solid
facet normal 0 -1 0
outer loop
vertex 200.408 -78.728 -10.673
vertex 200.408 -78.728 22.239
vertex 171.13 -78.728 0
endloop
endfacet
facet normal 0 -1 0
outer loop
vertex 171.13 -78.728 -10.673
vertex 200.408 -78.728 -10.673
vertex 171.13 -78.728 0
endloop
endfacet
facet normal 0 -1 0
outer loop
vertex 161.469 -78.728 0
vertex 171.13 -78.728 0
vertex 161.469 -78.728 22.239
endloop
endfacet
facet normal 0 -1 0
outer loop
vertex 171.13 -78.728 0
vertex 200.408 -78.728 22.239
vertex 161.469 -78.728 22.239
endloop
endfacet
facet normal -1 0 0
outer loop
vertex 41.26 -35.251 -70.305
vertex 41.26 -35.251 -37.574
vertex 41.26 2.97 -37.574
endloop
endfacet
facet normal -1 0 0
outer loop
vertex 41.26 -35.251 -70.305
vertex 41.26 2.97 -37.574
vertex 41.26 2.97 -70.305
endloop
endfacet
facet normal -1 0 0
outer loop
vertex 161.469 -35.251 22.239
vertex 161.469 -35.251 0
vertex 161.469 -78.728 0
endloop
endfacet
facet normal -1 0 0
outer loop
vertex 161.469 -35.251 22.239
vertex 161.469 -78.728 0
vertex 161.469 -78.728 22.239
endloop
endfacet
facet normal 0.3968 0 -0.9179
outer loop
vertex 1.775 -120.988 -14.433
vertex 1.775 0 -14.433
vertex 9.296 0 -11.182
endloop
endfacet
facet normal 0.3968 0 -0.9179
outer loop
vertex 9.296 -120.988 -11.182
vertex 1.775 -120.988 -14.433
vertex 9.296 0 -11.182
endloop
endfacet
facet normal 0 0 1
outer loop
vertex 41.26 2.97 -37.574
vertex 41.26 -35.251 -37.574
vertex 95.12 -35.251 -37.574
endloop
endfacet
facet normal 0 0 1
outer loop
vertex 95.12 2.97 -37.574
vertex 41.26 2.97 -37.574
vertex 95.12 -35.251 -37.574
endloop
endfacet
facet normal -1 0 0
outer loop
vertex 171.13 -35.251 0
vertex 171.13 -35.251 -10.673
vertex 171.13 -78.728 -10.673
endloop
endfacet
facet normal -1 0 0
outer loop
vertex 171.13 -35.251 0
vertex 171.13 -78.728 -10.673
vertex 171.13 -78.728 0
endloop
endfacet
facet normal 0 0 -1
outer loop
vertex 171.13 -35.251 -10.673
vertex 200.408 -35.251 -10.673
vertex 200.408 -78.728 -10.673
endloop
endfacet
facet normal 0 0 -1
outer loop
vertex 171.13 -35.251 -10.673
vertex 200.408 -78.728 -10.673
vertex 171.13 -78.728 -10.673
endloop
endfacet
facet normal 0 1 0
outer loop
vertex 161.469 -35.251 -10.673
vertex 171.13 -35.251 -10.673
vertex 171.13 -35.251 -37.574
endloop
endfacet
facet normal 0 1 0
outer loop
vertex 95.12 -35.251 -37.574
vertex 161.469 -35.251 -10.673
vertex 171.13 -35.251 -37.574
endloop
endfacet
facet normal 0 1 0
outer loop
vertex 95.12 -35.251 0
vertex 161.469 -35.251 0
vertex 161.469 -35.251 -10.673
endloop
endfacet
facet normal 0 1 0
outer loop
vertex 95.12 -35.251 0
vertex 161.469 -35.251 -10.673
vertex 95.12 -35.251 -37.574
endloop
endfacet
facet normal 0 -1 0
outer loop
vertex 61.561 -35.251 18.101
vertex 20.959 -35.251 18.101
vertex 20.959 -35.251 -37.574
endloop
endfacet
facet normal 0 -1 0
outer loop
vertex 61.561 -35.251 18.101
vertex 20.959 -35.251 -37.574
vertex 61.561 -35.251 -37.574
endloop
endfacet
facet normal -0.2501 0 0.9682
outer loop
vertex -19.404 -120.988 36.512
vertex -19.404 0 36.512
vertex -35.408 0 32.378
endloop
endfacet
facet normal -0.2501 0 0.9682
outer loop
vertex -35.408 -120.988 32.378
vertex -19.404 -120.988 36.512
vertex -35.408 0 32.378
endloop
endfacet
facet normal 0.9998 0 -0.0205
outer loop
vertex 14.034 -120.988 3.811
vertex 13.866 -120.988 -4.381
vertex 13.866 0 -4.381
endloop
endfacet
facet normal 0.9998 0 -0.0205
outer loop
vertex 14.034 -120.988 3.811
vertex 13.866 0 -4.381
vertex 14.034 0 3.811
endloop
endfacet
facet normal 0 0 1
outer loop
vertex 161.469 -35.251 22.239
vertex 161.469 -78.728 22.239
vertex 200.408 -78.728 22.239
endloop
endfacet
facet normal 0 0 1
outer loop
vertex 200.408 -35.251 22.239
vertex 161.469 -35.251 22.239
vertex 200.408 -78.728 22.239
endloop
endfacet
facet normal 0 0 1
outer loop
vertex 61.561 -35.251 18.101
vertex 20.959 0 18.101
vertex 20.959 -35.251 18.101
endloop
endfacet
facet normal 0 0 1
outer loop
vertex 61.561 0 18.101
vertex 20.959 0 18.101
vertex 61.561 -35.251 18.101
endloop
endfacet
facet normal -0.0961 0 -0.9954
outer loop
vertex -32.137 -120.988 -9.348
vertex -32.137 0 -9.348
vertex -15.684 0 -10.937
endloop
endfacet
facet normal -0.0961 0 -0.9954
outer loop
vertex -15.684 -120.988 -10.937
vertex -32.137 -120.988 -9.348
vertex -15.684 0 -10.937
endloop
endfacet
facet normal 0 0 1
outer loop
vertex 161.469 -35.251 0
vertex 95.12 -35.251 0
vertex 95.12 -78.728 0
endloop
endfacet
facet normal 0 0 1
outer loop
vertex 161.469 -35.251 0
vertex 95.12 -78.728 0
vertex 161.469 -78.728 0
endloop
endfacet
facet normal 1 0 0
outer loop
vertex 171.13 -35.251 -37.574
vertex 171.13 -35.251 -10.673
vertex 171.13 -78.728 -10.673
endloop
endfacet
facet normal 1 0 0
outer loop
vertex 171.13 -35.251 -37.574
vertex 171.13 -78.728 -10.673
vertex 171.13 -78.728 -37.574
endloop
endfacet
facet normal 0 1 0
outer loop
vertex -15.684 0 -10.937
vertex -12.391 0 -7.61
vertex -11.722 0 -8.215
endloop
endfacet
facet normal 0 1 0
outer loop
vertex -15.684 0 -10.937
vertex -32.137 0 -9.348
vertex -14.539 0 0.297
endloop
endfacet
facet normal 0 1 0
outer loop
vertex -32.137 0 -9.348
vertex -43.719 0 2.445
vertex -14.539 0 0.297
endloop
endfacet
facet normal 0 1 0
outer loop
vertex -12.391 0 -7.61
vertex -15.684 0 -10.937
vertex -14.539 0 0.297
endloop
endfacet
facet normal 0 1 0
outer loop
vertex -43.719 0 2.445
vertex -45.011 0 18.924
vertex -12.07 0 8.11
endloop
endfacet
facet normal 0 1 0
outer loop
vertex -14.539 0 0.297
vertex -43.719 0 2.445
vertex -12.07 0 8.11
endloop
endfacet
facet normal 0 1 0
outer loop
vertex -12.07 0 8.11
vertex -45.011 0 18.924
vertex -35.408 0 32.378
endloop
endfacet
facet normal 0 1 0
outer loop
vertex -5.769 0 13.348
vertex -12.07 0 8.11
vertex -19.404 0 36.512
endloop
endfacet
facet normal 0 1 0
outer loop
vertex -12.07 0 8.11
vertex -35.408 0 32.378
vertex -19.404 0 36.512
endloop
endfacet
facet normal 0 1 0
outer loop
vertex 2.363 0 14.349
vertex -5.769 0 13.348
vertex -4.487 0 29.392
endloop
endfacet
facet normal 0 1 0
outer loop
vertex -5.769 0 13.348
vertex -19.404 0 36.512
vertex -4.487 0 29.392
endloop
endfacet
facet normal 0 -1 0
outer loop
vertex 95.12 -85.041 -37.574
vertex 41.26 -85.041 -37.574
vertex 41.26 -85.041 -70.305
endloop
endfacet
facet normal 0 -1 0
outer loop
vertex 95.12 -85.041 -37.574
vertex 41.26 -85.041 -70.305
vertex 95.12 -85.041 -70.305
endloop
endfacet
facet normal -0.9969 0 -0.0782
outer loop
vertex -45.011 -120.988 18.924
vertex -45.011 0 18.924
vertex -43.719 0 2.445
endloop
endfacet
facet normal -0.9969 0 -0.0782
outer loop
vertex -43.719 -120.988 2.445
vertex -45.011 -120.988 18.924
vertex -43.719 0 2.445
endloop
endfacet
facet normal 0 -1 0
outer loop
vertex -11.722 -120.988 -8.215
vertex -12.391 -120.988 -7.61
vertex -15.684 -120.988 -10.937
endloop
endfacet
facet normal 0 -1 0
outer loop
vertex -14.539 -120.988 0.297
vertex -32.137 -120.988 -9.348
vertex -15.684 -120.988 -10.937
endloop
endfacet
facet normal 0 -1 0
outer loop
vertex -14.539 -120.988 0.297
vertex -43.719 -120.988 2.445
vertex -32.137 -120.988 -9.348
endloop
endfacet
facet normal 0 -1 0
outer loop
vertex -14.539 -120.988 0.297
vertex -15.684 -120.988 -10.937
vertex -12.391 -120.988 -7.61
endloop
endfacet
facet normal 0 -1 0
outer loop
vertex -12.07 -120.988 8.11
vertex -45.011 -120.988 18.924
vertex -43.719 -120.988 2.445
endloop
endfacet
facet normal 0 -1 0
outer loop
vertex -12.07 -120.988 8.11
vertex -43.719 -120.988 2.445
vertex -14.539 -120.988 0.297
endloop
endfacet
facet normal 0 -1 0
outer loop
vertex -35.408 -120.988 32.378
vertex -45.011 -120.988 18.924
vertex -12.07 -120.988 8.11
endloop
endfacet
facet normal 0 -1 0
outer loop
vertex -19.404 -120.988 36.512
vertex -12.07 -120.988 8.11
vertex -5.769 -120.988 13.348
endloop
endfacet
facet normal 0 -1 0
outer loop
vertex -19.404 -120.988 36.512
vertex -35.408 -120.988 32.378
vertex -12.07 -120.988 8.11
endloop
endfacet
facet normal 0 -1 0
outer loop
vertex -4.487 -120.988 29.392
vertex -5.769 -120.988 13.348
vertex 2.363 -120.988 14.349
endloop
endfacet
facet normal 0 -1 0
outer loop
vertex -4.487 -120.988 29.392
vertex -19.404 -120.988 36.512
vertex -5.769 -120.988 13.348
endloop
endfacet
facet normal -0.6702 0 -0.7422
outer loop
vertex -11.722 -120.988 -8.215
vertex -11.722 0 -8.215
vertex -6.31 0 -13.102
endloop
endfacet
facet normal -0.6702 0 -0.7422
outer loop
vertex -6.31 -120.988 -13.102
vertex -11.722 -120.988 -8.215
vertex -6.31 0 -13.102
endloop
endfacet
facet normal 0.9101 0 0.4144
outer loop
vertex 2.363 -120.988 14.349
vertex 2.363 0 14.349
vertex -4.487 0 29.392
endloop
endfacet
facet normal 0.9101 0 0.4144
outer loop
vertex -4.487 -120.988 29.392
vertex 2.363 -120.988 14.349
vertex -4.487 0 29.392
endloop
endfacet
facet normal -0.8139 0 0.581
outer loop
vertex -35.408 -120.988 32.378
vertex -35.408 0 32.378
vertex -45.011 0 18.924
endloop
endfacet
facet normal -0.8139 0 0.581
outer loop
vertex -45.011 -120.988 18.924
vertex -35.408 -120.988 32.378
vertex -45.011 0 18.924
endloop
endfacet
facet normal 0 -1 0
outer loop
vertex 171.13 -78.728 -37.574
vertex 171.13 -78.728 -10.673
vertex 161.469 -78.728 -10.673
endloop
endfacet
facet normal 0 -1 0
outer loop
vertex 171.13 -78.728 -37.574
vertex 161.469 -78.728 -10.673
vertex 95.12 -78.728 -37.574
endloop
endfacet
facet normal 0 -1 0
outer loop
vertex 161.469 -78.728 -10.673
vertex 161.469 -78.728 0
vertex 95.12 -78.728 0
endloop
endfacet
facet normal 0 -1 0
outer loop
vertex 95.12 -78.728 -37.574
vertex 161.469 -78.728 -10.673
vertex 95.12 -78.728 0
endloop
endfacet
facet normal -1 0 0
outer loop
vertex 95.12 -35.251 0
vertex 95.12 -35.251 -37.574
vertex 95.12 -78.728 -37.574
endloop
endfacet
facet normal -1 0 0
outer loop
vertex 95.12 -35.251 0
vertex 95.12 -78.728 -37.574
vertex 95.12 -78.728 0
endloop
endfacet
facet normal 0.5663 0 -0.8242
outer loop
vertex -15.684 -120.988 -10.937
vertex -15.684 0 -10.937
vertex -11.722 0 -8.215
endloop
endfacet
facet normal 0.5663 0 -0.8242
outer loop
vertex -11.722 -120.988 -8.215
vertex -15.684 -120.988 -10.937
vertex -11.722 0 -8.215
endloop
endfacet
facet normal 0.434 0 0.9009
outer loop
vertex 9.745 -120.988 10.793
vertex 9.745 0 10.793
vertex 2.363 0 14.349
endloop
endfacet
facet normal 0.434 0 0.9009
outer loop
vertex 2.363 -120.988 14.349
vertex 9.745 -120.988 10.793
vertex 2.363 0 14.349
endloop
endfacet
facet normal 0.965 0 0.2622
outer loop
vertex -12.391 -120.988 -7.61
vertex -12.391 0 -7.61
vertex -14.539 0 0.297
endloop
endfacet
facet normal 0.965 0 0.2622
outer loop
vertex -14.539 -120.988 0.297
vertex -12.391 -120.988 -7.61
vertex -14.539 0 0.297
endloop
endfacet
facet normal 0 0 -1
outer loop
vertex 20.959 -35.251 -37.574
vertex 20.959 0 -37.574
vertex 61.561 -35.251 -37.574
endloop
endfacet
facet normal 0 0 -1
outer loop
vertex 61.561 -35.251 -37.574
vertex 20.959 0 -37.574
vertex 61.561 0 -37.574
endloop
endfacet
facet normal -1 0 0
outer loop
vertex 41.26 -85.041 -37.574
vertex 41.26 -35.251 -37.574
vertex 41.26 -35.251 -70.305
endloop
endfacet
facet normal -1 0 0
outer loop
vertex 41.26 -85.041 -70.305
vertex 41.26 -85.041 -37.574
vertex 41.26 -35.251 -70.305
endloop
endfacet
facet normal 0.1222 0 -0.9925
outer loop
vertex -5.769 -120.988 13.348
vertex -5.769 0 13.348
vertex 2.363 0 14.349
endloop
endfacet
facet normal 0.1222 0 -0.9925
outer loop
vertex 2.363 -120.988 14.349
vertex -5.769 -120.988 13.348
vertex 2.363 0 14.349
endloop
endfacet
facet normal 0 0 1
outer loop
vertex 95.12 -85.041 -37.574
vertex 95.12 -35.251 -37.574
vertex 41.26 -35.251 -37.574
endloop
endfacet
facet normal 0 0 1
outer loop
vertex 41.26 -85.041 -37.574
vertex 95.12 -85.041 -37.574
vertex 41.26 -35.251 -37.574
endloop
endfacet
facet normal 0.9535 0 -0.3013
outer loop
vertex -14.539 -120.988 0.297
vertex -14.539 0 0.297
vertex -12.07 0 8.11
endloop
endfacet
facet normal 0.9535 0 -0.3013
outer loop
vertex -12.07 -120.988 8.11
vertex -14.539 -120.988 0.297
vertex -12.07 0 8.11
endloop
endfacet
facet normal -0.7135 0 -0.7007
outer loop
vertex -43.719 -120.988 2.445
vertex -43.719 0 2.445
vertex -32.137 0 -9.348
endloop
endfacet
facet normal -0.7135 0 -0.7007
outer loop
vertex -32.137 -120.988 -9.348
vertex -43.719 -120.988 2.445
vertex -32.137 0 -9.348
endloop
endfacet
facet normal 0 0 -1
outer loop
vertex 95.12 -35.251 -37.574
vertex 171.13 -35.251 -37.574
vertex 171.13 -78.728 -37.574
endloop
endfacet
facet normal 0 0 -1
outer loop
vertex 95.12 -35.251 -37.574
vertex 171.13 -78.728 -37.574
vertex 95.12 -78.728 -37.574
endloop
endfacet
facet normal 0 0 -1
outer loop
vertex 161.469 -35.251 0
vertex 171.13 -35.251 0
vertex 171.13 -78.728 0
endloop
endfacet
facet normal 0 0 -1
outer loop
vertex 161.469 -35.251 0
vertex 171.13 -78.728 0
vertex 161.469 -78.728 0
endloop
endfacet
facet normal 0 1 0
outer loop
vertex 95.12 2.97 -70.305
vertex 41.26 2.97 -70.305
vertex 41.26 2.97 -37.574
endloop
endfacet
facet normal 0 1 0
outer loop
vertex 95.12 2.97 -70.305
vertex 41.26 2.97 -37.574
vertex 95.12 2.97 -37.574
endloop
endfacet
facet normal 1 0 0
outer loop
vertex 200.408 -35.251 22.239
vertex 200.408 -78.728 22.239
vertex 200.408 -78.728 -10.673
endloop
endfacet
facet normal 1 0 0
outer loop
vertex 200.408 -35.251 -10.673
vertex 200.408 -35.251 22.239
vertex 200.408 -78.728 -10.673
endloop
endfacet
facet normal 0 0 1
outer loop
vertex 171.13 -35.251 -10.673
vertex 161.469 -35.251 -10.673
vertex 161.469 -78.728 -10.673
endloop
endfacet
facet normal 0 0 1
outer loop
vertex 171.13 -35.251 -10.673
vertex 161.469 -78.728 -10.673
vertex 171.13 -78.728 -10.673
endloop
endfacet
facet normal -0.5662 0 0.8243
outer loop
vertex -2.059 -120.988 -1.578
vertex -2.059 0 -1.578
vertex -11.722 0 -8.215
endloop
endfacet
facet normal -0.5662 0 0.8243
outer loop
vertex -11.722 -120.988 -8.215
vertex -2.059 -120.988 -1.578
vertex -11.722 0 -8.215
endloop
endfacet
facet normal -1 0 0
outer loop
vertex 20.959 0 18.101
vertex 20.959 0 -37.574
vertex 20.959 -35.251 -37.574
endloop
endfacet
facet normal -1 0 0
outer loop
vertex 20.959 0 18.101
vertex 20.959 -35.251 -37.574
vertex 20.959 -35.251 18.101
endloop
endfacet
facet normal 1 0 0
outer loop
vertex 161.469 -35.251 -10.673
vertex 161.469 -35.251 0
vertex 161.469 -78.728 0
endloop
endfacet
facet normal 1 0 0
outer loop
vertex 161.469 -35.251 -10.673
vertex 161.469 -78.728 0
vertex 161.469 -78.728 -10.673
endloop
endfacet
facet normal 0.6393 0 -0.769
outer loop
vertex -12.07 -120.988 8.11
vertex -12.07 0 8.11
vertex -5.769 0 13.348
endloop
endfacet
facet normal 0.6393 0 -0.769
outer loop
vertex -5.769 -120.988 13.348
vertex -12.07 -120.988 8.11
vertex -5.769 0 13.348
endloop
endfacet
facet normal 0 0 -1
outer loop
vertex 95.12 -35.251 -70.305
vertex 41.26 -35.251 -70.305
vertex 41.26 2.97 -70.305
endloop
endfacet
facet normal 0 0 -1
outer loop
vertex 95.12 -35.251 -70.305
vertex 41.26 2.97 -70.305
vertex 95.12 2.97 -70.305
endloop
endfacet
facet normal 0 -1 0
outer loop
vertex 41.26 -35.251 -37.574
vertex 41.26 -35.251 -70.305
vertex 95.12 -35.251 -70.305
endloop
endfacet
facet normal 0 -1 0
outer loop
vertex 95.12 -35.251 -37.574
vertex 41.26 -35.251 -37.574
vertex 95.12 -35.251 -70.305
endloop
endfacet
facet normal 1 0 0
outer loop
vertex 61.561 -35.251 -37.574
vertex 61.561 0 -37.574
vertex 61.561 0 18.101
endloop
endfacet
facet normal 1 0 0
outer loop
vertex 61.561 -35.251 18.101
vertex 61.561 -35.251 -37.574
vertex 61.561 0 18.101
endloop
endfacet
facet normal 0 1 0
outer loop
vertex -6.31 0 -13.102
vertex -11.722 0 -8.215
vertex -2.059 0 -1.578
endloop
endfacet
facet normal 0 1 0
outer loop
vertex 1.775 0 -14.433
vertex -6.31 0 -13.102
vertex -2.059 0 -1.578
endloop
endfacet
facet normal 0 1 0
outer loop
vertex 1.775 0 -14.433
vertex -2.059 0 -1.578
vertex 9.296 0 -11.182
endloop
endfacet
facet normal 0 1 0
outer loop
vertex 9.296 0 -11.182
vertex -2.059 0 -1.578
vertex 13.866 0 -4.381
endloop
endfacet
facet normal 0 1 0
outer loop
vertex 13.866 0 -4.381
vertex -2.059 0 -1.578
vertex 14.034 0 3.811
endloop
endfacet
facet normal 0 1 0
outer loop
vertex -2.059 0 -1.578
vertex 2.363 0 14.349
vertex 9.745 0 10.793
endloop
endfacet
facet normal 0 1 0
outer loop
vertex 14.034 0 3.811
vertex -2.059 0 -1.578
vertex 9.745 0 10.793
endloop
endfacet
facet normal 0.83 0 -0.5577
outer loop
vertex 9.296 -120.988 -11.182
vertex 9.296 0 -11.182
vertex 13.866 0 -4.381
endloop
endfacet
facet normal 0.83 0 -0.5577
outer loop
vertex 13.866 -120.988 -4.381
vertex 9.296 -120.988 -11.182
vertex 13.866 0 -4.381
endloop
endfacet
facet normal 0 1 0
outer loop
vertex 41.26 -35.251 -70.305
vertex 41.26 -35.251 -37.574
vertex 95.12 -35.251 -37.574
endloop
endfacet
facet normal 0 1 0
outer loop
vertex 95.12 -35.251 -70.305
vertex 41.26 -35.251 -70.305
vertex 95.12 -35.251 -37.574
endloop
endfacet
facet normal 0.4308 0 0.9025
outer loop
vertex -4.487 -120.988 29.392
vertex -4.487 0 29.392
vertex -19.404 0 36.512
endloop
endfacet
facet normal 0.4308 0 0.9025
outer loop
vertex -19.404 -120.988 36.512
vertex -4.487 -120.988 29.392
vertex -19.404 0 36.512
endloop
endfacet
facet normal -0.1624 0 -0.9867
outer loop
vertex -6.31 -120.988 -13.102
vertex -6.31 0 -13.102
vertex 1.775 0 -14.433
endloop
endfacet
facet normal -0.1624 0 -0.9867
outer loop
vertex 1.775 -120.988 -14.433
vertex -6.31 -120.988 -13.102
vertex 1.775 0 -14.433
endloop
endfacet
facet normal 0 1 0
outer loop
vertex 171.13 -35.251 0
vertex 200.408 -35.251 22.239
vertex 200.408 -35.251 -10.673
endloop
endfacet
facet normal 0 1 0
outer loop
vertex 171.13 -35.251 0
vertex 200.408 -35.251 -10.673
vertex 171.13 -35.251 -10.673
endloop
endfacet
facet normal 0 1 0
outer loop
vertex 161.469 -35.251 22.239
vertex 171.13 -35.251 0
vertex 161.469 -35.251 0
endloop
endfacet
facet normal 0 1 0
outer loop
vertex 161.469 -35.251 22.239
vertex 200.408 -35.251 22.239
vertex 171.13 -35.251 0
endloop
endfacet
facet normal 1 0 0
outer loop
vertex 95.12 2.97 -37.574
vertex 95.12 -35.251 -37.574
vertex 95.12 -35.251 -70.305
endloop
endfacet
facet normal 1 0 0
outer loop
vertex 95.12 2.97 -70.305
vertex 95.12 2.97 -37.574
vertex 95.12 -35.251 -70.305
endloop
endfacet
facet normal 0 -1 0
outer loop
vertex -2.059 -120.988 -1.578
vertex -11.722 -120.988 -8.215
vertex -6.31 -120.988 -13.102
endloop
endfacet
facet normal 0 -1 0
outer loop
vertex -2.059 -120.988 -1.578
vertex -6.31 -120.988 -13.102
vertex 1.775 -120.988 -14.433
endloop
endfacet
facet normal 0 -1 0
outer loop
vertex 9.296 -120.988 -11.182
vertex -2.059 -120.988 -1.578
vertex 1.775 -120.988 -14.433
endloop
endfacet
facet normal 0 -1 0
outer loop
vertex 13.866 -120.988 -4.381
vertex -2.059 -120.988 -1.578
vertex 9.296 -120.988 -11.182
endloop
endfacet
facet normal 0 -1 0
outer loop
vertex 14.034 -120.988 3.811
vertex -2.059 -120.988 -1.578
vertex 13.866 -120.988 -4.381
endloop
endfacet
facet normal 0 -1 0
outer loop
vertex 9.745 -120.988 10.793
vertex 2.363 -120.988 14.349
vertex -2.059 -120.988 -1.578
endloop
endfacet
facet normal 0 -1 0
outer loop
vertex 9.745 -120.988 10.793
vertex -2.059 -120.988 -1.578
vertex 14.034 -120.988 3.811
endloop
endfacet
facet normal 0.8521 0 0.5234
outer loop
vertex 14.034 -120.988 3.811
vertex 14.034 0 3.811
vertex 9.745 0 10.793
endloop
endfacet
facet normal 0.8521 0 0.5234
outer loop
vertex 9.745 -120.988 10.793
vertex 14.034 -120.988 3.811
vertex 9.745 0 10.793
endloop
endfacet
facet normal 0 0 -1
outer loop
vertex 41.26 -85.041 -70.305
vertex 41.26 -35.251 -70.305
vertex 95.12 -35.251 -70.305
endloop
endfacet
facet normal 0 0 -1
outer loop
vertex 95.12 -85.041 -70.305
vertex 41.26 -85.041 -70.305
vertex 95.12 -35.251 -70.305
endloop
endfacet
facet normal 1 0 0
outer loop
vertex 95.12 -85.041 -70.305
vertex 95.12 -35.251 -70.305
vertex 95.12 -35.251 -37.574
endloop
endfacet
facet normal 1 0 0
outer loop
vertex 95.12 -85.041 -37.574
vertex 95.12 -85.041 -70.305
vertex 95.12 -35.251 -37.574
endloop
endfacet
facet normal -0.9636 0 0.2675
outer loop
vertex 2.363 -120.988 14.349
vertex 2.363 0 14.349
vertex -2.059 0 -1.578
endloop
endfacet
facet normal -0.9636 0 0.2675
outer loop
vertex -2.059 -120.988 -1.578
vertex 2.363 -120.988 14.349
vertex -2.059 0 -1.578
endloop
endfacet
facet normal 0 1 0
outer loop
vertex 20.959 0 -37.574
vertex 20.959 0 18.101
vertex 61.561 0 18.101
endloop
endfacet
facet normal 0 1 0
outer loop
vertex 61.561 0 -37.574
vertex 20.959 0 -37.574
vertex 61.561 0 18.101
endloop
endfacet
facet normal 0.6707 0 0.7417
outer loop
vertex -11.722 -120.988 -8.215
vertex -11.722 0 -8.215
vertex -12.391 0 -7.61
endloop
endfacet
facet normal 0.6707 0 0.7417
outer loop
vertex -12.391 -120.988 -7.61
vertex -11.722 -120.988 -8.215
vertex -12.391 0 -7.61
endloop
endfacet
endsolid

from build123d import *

# Parameters (mm, degrees)
F1_DEPTH  = 120.988414
F2_W      = 40.60153
F2_H      = 55.675119
F3_DEPTH  = 35.250731
F5_DEPTH  = 49.789887
F7_DEPTH  = 43.476962
F5_FACE_W = 53.860638
F5_FACE_H = 32.730096
F8_DEPTH  = 38.220398


with BuildPart() as f1:
    # F0 (on Front) → F1 (new body)
    with BuildSketch(Plane.XZ):
        Polygon((-32.136902, -9.347696), (-15.684007, -10.936837), (-11.721509, -8.215211), (-12.39141, -7.610341), (-14.538778, 0.297076), (-12.070187, 8.110173), (-5.769397, 13.348347), (2.363136, 14.348516), (-4.487076, 29.391712), (-19.404222, 36.512237), (-35.408405, 32.378319), (-45.011089, 18.924264), (-43.719072, 2.445374), align=None)
        Polygon((-2.058878, -1.578472), (-11.721509, -8.215211), (-6.309856, -13.101528), (1.775032, -14.433073), (9.29636, -11.182218), (13.86616, -4.381089), (14.033551, 3.811005), (9.74539, 10.793132), (2.363136, 14.348516), align=None)
    extrude(amount=F1_DEPTH)


with BuildPart() as f3:
    # F2 (on Front) → F3 (new body)
    with BuildSketch(Plane.XZ):
        with Locations((41.259747, -9.736859)):
            Rectangle(F2_W, F2_H)
    extrude(amount=F3_DEPTH)


with BuildPart() as f5:
    # F4 (on face) → F5 (new body)
    with BuildSketch(Plane.XZ.offset(35.250731)):
        Polygon((61.560512, -37.574418), (41.259747, -37.574418), (41.259747, -70.304513), (95.120385, -70.304513), (95.120385, -37.574418), align=None)
    extrude(amount=F5_DEPTH)


with BuildPart() as f7:
    # F6 (on face) → F7 (new body)
    with BuildSketch(Plane(origin=(0, -35.250731, 0), x_dir=(-1, 0, 0), z_dir=(0, 1, 0))):
        Polygon((-95.120385, 0), (-161.469132, 0), (-161.469132, -10.673147), (-171.130016, -10.673147), (-171.130016, -37.574418), (-95.120385, -37.574418), align=None)
        Polygon((-171.130016, -10.673147), (-171.130016, 0), (-161.469132, 0), (-161.469132, 22.239052), (-200.407609, 22.239052), (-200.407609, -10.673147), align=None)
    extrude(amount=-F7_DEPTH)


with BuildPart() as f8:
    # F5_face (on face) → F8 (new body)
    with BuildSketch(Plane(origin=(68.190066, -35.250731, -53.939465), x_dir=(1, 0, 0), z_dir=(0, 1, 0))):
        Rectangle(F5_FACE_W, F5_FACE_H)
    extrude(amount=F8_DEPTH)


solid = Compound([f1.part, f3.part, f5.part, f7.part, f8.part])
